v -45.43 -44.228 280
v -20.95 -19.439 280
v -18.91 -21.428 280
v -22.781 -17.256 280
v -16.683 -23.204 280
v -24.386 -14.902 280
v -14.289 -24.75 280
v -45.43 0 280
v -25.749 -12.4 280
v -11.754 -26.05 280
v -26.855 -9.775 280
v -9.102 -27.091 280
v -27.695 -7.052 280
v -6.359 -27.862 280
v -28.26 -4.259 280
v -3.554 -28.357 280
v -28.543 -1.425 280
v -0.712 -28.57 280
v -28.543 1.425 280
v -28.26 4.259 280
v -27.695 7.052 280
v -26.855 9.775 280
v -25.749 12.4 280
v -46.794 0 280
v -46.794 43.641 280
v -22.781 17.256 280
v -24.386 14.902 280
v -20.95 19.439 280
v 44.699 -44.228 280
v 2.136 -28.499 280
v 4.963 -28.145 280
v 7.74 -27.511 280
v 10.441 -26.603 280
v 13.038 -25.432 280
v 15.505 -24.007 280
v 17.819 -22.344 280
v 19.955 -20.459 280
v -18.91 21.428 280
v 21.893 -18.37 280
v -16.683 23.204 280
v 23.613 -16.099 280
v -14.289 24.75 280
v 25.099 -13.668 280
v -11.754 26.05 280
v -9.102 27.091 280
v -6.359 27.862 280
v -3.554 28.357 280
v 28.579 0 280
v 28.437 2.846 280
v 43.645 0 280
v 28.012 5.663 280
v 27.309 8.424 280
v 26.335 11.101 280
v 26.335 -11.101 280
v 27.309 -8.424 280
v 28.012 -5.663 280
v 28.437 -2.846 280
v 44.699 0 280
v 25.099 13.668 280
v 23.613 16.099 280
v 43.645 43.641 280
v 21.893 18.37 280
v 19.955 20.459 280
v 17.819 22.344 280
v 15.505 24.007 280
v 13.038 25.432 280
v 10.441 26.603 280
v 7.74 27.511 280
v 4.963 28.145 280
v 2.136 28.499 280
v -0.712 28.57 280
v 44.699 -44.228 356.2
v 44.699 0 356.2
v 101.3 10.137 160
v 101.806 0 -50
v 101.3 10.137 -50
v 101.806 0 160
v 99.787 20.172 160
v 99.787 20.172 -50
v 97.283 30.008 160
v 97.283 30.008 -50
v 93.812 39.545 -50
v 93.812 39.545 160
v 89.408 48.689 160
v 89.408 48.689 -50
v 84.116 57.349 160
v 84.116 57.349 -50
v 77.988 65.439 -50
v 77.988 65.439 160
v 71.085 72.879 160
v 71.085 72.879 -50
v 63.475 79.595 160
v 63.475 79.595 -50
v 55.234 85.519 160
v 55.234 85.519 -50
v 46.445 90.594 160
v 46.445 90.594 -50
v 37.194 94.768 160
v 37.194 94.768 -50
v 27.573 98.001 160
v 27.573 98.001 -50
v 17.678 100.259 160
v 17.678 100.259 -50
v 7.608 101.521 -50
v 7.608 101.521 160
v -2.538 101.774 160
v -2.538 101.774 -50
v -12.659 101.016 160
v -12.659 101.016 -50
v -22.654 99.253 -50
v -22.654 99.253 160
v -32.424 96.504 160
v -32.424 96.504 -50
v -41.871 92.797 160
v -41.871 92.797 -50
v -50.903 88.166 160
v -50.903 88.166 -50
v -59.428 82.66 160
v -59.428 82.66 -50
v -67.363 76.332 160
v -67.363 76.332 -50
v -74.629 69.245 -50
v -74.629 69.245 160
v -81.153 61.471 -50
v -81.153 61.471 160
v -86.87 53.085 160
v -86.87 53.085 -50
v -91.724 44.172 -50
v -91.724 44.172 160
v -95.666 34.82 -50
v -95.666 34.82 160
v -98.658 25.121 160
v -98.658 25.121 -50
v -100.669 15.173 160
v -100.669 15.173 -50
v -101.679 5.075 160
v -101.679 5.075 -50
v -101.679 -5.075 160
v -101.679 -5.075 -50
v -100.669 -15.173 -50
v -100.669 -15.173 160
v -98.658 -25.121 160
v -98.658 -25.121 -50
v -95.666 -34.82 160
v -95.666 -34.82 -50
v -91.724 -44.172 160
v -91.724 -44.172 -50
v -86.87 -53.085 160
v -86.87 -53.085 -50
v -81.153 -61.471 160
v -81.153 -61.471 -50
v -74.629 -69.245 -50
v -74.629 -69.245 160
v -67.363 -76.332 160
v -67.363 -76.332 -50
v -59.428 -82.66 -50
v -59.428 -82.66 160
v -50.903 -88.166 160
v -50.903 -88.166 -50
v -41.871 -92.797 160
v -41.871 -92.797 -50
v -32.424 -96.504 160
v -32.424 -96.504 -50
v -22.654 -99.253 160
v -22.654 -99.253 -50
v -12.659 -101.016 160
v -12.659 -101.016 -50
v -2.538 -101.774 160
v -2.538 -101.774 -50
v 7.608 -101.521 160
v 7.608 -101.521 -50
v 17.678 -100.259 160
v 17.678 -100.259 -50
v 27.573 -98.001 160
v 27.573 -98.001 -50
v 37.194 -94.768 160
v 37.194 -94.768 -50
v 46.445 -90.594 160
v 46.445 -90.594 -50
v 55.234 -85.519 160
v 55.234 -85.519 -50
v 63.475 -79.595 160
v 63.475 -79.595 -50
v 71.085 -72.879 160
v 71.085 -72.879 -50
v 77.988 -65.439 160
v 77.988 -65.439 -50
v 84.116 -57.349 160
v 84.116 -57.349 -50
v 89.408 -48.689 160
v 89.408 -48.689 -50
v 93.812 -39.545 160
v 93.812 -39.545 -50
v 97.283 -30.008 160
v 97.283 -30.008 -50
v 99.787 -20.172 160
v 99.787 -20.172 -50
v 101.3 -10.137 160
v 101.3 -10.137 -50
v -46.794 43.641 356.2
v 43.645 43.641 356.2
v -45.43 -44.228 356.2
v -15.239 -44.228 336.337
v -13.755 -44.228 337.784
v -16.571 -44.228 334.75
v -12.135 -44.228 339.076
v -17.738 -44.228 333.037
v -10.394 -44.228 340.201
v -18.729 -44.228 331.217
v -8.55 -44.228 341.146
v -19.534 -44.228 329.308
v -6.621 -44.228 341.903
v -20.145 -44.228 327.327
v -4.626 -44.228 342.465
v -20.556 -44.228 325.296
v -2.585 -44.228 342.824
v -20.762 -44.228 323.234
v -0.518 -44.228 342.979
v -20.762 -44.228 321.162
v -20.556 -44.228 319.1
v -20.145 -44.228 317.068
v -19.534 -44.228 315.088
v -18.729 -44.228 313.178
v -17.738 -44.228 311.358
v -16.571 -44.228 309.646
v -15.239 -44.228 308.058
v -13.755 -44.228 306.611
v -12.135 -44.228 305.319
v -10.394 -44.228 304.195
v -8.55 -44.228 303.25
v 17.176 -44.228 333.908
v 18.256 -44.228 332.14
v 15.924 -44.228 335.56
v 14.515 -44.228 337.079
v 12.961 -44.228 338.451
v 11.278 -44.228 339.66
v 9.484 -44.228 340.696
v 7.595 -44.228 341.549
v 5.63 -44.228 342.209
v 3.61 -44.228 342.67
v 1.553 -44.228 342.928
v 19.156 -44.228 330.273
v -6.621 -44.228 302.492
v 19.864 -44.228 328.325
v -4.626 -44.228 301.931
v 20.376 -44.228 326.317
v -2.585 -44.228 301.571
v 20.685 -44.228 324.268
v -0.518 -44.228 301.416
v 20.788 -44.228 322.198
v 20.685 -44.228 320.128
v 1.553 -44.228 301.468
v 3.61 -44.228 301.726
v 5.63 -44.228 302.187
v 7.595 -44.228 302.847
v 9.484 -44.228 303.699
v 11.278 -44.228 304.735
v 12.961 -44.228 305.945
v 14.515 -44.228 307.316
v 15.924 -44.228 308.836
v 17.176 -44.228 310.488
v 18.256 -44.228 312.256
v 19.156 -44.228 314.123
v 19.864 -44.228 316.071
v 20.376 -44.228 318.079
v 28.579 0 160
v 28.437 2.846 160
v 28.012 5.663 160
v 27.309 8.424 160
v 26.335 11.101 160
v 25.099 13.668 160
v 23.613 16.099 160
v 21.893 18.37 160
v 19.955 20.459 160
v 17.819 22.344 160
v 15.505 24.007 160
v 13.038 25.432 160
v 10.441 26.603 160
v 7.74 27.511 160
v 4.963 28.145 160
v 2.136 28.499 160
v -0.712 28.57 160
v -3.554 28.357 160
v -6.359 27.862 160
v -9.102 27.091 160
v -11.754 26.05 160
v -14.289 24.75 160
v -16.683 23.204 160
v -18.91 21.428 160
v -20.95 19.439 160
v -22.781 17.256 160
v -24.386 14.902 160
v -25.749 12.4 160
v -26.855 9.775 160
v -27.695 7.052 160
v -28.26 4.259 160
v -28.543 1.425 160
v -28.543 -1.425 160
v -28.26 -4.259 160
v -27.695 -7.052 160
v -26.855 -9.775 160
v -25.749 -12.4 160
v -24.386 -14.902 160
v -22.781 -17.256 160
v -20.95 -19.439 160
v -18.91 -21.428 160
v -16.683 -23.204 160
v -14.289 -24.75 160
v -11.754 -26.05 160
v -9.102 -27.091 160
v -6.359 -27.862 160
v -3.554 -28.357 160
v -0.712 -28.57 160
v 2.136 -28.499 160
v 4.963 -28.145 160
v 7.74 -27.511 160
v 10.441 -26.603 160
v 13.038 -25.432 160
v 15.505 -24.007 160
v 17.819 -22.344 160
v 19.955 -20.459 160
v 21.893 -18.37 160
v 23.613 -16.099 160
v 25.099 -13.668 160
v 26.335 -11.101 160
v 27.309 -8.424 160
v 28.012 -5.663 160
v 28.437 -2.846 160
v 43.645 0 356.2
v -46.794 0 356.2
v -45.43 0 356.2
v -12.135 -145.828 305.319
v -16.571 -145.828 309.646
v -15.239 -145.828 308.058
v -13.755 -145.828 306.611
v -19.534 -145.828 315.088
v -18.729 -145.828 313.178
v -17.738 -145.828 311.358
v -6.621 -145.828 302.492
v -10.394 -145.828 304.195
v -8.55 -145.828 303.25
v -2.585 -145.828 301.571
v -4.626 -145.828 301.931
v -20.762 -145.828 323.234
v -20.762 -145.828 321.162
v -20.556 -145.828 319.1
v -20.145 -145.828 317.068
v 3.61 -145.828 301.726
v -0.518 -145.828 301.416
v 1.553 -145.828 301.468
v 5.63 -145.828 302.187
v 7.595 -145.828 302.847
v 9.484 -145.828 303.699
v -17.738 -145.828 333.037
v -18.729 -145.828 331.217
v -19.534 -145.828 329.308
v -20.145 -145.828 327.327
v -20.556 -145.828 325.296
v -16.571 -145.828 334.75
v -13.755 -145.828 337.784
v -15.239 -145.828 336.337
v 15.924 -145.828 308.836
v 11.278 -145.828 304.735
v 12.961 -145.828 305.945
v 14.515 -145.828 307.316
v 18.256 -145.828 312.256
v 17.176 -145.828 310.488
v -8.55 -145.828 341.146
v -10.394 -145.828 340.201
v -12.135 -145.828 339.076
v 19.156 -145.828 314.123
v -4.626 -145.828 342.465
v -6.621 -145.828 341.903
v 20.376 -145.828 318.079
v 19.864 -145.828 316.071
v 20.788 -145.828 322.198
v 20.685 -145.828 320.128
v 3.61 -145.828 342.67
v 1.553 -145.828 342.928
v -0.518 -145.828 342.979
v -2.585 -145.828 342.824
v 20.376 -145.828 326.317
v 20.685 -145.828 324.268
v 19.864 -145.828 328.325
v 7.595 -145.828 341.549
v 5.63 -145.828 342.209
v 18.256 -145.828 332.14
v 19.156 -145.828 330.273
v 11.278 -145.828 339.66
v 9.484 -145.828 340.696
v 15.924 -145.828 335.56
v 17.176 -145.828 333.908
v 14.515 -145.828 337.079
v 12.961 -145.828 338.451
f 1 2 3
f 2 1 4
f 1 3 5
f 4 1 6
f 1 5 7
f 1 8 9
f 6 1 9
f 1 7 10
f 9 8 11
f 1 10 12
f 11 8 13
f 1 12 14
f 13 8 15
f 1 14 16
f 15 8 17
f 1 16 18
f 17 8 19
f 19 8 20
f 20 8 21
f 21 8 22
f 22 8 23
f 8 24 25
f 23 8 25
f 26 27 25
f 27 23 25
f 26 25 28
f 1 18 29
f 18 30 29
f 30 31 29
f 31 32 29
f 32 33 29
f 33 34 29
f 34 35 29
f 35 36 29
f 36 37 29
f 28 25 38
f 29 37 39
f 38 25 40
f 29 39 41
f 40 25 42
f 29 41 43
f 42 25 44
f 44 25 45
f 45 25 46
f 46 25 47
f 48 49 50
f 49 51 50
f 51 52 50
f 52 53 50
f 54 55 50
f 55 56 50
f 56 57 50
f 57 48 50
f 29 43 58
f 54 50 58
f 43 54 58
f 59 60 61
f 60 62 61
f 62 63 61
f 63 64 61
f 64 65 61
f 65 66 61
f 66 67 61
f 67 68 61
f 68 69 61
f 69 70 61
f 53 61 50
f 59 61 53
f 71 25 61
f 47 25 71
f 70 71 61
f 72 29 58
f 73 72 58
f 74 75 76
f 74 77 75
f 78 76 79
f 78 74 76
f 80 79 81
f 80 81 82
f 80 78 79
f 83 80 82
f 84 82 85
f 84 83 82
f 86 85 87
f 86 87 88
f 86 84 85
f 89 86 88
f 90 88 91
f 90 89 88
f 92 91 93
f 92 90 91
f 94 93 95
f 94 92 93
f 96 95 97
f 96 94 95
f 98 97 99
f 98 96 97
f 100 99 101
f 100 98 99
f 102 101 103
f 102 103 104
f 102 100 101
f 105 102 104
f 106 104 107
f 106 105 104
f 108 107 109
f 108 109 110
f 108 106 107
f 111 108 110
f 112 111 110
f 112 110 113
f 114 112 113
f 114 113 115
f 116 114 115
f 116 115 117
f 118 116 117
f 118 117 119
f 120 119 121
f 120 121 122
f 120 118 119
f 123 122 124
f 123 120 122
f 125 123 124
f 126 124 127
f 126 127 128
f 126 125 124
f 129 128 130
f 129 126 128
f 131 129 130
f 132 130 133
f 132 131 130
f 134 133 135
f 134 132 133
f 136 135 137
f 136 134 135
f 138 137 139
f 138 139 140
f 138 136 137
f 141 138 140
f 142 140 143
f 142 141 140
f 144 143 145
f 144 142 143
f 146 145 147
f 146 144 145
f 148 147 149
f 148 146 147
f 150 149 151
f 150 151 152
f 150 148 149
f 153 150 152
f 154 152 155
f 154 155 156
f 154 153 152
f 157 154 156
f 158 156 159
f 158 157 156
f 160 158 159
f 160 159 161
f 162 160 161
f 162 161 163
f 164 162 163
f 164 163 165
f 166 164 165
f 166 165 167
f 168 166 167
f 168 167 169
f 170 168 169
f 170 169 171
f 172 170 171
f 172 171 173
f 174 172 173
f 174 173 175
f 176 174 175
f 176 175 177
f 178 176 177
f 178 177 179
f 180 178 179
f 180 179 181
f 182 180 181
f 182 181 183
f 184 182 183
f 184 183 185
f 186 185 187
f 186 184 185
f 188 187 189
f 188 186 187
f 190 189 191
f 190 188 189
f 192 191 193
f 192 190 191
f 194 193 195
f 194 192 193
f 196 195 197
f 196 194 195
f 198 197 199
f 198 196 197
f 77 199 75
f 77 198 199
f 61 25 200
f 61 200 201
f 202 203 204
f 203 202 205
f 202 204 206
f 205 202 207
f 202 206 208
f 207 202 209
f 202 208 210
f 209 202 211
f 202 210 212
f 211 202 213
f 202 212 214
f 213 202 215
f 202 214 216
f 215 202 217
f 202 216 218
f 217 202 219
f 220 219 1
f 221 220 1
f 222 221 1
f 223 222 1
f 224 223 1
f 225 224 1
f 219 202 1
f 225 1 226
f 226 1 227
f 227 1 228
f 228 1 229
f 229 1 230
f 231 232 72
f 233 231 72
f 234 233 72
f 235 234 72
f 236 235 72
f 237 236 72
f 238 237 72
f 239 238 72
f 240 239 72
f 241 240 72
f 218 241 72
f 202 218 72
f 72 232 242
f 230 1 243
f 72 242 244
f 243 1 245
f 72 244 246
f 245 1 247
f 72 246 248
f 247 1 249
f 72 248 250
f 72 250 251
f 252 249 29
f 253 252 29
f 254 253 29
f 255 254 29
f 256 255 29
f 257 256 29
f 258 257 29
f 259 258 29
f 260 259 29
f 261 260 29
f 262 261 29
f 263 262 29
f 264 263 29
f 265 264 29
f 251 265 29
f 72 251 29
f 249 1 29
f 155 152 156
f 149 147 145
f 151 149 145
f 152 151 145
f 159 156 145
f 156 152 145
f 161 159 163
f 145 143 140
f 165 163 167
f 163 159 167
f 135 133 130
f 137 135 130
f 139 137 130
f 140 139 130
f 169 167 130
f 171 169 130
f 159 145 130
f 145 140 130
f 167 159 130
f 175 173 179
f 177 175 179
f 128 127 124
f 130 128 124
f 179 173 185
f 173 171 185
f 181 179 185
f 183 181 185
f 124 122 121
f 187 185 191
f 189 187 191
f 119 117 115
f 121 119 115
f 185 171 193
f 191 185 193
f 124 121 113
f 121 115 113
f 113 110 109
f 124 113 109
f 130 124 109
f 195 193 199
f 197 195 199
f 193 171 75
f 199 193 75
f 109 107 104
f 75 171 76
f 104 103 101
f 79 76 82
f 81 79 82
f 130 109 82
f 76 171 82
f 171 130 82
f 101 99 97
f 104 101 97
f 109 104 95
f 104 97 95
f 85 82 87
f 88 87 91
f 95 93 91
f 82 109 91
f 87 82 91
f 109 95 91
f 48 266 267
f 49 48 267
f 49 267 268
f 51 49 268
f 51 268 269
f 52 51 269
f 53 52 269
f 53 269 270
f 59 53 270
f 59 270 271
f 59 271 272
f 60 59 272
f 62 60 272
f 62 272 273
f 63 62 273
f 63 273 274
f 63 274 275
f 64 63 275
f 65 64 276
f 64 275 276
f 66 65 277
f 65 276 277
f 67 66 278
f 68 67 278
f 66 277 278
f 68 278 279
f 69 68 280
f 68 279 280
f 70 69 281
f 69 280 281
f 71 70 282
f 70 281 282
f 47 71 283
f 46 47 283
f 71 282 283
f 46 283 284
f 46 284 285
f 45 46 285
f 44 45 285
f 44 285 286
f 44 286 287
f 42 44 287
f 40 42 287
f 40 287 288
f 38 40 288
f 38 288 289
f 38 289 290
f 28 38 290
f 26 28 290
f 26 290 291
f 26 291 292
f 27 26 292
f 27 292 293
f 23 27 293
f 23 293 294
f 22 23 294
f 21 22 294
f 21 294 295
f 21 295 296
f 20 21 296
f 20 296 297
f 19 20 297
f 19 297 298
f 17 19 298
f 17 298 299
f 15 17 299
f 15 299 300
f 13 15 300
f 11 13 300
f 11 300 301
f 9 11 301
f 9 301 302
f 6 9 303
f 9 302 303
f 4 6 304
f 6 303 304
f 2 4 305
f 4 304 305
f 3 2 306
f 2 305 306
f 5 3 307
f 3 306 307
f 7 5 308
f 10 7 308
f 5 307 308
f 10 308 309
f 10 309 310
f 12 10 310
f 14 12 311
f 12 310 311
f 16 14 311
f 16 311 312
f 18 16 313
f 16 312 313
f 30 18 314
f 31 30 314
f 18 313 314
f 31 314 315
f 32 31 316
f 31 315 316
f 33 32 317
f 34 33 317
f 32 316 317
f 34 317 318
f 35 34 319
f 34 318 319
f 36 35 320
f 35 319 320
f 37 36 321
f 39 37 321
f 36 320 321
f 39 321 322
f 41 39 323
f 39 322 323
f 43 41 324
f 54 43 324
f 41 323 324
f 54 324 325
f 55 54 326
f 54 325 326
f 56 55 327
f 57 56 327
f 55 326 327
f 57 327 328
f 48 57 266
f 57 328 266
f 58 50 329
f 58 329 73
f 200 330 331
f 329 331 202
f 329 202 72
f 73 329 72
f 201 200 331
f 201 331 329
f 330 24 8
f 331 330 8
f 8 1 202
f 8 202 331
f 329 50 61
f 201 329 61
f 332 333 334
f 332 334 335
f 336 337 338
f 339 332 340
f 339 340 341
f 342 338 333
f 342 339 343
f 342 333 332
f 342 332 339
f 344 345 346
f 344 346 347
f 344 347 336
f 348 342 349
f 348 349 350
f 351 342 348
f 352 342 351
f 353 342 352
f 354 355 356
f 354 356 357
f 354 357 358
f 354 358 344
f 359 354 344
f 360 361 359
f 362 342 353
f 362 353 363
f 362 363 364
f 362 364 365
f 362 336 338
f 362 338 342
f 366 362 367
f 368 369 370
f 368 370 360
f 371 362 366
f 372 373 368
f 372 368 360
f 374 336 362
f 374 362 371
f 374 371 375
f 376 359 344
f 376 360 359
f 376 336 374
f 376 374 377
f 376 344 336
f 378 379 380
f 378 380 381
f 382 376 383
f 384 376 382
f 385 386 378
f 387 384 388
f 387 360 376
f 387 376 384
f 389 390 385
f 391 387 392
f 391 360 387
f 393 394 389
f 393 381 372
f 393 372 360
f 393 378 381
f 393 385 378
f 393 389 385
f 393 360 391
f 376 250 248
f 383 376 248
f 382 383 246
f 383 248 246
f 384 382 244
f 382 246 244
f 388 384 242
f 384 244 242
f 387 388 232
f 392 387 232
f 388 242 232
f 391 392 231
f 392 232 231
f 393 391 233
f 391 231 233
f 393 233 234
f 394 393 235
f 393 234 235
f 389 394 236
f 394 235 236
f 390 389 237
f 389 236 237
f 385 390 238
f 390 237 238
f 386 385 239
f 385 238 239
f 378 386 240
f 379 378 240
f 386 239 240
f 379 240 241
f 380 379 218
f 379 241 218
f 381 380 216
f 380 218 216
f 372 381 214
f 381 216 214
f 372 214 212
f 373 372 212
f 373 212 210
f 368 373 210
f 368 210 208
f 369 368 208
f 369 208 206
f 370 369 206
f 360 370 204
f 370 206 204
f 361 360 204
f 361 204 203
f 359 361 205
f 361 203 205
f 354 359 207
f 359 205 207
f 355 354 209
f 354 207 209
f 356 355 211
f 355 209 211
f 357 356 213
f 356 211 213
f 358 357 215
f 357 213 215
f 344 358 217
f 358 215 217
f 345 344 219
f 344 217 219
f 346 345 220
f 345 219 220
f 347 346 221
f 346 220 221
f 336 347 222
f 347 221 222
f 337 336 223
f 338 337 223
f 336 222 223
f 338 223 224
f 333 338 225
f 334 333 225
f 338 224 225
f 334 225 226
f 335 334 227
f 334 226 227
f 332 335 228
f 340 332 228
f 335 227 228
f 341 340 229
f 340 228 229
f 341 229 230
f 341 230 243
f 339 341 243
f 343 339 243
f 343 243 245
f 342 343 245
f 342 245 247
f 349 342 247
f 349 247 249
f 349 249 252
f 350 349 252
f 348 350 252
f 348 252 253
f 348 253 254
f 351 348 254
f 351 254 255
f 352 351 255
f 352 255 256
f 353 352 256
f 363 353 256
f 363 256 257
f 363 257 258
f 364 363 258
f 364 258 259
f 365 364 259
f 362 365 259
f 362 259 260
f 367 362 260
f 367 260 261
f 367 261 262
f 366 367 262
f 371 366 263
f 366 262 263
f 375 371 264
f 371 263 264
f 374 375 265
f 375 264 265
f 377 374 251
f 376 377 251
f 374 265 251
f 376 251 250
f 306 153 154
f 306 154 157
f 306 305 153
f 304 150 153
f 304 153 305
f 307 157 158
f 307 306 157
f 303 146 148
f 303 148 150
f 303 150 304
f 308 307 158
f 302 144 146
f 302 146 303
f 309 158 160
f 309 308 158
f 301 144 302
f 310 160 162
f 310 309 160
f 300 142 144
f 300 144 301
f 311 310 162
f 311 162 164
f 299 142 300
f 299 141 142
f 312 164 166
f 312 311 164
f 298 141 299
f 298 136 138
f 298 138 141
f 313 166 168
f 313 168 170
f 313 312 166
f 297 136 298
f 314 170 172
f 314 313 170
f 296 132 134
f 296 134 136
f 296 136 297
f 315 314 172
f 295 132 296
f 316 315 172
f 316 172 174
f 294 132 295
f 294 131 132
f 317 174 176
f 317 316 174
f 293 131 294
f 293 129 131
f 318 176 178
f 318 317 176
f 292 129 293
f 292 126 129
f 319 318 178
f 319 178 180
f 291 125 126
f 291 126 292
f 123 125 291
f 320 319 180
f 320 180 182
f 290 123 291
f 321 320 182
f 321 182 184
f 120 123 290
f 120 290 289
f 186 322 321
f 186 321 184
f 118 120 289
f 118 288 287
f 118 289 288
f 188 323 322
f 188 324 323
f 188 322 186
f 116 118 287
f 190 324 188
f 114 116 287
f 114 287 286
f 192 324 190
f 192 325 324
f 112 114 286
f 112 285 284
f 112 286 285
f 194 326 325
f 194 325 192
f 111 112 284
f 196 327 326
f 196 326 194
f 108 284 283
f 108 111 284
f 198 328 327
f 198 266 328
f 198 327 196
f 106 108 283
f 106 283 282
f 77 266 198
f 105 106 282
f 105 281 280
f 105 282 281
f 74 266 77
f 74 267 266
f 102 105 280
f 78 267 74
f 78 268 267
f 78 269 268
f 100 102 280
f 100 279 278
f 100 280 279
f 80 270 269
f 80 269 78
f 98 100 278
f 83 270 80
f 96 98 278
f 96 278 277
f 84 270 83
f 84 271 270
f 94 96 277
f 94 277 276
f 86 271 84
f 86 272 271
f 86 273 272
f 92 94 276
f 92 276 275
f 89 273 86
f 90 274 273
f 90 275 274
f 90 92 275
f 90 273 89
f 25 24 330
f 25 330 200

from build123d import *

# Parameters (mm, degrees)
F0_R      = 101.8057448426
F1_DEPTH  = 160
F2_R      = 28.5788941191
F3_DEPTH  = 120
F4_DEPTH  = 50
F6_W      = 90.1293829083
F6_H      = 44.228348881
F7_W      = 90.4394574463
F7_H      = 43.640833348
F8_DEPTH  = 76.2
F9_R      = 20.7879230701
F10_DEPTH = 101.6


with BuildPart() as f1:
    # F0 (on Top) → F1 (new body)
    with BuildSketch(Plane.XY):
        Circle(F0_R)
    extrude(amount=F1_DEPTH)

    # F2 (on face) → F3 (join)
    with BuildSketch(Plane.XY.offset(160)):
        Circle(F2_R)
    extrude(amount=F3_DEPTH)

    # F4 (add): a face of the model
    f4_faces = [f1.faces().sort_by_distance(p)[0] for p in [
        (0, 0, 0),
    ]]
    extrude(f4_faces, amount=F4_DEPTH)

    # F6 (on face) + F7 (on face) → F8 (join)
    with BuildSketch(Plane.XY.offset(280)):
        with Locations((-0.3652684391, -22.1141744405)):
            Rectangle(F6_W, F6_H)
    with BuildSketch(Plane.XY.offset(280)):
        with Locations((-1.5747603029, 21.820416674)):
            Rectangle(F7_W, F7_H)
    extrude(amount=F8_DEPTH)

    # F9 (on face) → F10 (join)
    with BuildSketch(Plane.XZ.offset(44.228348881)):
        with Locations((0, 322.1978545189)):
            Circle(F9_R)
    extrude(amount=F10_DEPTH)


solid = f1.part
